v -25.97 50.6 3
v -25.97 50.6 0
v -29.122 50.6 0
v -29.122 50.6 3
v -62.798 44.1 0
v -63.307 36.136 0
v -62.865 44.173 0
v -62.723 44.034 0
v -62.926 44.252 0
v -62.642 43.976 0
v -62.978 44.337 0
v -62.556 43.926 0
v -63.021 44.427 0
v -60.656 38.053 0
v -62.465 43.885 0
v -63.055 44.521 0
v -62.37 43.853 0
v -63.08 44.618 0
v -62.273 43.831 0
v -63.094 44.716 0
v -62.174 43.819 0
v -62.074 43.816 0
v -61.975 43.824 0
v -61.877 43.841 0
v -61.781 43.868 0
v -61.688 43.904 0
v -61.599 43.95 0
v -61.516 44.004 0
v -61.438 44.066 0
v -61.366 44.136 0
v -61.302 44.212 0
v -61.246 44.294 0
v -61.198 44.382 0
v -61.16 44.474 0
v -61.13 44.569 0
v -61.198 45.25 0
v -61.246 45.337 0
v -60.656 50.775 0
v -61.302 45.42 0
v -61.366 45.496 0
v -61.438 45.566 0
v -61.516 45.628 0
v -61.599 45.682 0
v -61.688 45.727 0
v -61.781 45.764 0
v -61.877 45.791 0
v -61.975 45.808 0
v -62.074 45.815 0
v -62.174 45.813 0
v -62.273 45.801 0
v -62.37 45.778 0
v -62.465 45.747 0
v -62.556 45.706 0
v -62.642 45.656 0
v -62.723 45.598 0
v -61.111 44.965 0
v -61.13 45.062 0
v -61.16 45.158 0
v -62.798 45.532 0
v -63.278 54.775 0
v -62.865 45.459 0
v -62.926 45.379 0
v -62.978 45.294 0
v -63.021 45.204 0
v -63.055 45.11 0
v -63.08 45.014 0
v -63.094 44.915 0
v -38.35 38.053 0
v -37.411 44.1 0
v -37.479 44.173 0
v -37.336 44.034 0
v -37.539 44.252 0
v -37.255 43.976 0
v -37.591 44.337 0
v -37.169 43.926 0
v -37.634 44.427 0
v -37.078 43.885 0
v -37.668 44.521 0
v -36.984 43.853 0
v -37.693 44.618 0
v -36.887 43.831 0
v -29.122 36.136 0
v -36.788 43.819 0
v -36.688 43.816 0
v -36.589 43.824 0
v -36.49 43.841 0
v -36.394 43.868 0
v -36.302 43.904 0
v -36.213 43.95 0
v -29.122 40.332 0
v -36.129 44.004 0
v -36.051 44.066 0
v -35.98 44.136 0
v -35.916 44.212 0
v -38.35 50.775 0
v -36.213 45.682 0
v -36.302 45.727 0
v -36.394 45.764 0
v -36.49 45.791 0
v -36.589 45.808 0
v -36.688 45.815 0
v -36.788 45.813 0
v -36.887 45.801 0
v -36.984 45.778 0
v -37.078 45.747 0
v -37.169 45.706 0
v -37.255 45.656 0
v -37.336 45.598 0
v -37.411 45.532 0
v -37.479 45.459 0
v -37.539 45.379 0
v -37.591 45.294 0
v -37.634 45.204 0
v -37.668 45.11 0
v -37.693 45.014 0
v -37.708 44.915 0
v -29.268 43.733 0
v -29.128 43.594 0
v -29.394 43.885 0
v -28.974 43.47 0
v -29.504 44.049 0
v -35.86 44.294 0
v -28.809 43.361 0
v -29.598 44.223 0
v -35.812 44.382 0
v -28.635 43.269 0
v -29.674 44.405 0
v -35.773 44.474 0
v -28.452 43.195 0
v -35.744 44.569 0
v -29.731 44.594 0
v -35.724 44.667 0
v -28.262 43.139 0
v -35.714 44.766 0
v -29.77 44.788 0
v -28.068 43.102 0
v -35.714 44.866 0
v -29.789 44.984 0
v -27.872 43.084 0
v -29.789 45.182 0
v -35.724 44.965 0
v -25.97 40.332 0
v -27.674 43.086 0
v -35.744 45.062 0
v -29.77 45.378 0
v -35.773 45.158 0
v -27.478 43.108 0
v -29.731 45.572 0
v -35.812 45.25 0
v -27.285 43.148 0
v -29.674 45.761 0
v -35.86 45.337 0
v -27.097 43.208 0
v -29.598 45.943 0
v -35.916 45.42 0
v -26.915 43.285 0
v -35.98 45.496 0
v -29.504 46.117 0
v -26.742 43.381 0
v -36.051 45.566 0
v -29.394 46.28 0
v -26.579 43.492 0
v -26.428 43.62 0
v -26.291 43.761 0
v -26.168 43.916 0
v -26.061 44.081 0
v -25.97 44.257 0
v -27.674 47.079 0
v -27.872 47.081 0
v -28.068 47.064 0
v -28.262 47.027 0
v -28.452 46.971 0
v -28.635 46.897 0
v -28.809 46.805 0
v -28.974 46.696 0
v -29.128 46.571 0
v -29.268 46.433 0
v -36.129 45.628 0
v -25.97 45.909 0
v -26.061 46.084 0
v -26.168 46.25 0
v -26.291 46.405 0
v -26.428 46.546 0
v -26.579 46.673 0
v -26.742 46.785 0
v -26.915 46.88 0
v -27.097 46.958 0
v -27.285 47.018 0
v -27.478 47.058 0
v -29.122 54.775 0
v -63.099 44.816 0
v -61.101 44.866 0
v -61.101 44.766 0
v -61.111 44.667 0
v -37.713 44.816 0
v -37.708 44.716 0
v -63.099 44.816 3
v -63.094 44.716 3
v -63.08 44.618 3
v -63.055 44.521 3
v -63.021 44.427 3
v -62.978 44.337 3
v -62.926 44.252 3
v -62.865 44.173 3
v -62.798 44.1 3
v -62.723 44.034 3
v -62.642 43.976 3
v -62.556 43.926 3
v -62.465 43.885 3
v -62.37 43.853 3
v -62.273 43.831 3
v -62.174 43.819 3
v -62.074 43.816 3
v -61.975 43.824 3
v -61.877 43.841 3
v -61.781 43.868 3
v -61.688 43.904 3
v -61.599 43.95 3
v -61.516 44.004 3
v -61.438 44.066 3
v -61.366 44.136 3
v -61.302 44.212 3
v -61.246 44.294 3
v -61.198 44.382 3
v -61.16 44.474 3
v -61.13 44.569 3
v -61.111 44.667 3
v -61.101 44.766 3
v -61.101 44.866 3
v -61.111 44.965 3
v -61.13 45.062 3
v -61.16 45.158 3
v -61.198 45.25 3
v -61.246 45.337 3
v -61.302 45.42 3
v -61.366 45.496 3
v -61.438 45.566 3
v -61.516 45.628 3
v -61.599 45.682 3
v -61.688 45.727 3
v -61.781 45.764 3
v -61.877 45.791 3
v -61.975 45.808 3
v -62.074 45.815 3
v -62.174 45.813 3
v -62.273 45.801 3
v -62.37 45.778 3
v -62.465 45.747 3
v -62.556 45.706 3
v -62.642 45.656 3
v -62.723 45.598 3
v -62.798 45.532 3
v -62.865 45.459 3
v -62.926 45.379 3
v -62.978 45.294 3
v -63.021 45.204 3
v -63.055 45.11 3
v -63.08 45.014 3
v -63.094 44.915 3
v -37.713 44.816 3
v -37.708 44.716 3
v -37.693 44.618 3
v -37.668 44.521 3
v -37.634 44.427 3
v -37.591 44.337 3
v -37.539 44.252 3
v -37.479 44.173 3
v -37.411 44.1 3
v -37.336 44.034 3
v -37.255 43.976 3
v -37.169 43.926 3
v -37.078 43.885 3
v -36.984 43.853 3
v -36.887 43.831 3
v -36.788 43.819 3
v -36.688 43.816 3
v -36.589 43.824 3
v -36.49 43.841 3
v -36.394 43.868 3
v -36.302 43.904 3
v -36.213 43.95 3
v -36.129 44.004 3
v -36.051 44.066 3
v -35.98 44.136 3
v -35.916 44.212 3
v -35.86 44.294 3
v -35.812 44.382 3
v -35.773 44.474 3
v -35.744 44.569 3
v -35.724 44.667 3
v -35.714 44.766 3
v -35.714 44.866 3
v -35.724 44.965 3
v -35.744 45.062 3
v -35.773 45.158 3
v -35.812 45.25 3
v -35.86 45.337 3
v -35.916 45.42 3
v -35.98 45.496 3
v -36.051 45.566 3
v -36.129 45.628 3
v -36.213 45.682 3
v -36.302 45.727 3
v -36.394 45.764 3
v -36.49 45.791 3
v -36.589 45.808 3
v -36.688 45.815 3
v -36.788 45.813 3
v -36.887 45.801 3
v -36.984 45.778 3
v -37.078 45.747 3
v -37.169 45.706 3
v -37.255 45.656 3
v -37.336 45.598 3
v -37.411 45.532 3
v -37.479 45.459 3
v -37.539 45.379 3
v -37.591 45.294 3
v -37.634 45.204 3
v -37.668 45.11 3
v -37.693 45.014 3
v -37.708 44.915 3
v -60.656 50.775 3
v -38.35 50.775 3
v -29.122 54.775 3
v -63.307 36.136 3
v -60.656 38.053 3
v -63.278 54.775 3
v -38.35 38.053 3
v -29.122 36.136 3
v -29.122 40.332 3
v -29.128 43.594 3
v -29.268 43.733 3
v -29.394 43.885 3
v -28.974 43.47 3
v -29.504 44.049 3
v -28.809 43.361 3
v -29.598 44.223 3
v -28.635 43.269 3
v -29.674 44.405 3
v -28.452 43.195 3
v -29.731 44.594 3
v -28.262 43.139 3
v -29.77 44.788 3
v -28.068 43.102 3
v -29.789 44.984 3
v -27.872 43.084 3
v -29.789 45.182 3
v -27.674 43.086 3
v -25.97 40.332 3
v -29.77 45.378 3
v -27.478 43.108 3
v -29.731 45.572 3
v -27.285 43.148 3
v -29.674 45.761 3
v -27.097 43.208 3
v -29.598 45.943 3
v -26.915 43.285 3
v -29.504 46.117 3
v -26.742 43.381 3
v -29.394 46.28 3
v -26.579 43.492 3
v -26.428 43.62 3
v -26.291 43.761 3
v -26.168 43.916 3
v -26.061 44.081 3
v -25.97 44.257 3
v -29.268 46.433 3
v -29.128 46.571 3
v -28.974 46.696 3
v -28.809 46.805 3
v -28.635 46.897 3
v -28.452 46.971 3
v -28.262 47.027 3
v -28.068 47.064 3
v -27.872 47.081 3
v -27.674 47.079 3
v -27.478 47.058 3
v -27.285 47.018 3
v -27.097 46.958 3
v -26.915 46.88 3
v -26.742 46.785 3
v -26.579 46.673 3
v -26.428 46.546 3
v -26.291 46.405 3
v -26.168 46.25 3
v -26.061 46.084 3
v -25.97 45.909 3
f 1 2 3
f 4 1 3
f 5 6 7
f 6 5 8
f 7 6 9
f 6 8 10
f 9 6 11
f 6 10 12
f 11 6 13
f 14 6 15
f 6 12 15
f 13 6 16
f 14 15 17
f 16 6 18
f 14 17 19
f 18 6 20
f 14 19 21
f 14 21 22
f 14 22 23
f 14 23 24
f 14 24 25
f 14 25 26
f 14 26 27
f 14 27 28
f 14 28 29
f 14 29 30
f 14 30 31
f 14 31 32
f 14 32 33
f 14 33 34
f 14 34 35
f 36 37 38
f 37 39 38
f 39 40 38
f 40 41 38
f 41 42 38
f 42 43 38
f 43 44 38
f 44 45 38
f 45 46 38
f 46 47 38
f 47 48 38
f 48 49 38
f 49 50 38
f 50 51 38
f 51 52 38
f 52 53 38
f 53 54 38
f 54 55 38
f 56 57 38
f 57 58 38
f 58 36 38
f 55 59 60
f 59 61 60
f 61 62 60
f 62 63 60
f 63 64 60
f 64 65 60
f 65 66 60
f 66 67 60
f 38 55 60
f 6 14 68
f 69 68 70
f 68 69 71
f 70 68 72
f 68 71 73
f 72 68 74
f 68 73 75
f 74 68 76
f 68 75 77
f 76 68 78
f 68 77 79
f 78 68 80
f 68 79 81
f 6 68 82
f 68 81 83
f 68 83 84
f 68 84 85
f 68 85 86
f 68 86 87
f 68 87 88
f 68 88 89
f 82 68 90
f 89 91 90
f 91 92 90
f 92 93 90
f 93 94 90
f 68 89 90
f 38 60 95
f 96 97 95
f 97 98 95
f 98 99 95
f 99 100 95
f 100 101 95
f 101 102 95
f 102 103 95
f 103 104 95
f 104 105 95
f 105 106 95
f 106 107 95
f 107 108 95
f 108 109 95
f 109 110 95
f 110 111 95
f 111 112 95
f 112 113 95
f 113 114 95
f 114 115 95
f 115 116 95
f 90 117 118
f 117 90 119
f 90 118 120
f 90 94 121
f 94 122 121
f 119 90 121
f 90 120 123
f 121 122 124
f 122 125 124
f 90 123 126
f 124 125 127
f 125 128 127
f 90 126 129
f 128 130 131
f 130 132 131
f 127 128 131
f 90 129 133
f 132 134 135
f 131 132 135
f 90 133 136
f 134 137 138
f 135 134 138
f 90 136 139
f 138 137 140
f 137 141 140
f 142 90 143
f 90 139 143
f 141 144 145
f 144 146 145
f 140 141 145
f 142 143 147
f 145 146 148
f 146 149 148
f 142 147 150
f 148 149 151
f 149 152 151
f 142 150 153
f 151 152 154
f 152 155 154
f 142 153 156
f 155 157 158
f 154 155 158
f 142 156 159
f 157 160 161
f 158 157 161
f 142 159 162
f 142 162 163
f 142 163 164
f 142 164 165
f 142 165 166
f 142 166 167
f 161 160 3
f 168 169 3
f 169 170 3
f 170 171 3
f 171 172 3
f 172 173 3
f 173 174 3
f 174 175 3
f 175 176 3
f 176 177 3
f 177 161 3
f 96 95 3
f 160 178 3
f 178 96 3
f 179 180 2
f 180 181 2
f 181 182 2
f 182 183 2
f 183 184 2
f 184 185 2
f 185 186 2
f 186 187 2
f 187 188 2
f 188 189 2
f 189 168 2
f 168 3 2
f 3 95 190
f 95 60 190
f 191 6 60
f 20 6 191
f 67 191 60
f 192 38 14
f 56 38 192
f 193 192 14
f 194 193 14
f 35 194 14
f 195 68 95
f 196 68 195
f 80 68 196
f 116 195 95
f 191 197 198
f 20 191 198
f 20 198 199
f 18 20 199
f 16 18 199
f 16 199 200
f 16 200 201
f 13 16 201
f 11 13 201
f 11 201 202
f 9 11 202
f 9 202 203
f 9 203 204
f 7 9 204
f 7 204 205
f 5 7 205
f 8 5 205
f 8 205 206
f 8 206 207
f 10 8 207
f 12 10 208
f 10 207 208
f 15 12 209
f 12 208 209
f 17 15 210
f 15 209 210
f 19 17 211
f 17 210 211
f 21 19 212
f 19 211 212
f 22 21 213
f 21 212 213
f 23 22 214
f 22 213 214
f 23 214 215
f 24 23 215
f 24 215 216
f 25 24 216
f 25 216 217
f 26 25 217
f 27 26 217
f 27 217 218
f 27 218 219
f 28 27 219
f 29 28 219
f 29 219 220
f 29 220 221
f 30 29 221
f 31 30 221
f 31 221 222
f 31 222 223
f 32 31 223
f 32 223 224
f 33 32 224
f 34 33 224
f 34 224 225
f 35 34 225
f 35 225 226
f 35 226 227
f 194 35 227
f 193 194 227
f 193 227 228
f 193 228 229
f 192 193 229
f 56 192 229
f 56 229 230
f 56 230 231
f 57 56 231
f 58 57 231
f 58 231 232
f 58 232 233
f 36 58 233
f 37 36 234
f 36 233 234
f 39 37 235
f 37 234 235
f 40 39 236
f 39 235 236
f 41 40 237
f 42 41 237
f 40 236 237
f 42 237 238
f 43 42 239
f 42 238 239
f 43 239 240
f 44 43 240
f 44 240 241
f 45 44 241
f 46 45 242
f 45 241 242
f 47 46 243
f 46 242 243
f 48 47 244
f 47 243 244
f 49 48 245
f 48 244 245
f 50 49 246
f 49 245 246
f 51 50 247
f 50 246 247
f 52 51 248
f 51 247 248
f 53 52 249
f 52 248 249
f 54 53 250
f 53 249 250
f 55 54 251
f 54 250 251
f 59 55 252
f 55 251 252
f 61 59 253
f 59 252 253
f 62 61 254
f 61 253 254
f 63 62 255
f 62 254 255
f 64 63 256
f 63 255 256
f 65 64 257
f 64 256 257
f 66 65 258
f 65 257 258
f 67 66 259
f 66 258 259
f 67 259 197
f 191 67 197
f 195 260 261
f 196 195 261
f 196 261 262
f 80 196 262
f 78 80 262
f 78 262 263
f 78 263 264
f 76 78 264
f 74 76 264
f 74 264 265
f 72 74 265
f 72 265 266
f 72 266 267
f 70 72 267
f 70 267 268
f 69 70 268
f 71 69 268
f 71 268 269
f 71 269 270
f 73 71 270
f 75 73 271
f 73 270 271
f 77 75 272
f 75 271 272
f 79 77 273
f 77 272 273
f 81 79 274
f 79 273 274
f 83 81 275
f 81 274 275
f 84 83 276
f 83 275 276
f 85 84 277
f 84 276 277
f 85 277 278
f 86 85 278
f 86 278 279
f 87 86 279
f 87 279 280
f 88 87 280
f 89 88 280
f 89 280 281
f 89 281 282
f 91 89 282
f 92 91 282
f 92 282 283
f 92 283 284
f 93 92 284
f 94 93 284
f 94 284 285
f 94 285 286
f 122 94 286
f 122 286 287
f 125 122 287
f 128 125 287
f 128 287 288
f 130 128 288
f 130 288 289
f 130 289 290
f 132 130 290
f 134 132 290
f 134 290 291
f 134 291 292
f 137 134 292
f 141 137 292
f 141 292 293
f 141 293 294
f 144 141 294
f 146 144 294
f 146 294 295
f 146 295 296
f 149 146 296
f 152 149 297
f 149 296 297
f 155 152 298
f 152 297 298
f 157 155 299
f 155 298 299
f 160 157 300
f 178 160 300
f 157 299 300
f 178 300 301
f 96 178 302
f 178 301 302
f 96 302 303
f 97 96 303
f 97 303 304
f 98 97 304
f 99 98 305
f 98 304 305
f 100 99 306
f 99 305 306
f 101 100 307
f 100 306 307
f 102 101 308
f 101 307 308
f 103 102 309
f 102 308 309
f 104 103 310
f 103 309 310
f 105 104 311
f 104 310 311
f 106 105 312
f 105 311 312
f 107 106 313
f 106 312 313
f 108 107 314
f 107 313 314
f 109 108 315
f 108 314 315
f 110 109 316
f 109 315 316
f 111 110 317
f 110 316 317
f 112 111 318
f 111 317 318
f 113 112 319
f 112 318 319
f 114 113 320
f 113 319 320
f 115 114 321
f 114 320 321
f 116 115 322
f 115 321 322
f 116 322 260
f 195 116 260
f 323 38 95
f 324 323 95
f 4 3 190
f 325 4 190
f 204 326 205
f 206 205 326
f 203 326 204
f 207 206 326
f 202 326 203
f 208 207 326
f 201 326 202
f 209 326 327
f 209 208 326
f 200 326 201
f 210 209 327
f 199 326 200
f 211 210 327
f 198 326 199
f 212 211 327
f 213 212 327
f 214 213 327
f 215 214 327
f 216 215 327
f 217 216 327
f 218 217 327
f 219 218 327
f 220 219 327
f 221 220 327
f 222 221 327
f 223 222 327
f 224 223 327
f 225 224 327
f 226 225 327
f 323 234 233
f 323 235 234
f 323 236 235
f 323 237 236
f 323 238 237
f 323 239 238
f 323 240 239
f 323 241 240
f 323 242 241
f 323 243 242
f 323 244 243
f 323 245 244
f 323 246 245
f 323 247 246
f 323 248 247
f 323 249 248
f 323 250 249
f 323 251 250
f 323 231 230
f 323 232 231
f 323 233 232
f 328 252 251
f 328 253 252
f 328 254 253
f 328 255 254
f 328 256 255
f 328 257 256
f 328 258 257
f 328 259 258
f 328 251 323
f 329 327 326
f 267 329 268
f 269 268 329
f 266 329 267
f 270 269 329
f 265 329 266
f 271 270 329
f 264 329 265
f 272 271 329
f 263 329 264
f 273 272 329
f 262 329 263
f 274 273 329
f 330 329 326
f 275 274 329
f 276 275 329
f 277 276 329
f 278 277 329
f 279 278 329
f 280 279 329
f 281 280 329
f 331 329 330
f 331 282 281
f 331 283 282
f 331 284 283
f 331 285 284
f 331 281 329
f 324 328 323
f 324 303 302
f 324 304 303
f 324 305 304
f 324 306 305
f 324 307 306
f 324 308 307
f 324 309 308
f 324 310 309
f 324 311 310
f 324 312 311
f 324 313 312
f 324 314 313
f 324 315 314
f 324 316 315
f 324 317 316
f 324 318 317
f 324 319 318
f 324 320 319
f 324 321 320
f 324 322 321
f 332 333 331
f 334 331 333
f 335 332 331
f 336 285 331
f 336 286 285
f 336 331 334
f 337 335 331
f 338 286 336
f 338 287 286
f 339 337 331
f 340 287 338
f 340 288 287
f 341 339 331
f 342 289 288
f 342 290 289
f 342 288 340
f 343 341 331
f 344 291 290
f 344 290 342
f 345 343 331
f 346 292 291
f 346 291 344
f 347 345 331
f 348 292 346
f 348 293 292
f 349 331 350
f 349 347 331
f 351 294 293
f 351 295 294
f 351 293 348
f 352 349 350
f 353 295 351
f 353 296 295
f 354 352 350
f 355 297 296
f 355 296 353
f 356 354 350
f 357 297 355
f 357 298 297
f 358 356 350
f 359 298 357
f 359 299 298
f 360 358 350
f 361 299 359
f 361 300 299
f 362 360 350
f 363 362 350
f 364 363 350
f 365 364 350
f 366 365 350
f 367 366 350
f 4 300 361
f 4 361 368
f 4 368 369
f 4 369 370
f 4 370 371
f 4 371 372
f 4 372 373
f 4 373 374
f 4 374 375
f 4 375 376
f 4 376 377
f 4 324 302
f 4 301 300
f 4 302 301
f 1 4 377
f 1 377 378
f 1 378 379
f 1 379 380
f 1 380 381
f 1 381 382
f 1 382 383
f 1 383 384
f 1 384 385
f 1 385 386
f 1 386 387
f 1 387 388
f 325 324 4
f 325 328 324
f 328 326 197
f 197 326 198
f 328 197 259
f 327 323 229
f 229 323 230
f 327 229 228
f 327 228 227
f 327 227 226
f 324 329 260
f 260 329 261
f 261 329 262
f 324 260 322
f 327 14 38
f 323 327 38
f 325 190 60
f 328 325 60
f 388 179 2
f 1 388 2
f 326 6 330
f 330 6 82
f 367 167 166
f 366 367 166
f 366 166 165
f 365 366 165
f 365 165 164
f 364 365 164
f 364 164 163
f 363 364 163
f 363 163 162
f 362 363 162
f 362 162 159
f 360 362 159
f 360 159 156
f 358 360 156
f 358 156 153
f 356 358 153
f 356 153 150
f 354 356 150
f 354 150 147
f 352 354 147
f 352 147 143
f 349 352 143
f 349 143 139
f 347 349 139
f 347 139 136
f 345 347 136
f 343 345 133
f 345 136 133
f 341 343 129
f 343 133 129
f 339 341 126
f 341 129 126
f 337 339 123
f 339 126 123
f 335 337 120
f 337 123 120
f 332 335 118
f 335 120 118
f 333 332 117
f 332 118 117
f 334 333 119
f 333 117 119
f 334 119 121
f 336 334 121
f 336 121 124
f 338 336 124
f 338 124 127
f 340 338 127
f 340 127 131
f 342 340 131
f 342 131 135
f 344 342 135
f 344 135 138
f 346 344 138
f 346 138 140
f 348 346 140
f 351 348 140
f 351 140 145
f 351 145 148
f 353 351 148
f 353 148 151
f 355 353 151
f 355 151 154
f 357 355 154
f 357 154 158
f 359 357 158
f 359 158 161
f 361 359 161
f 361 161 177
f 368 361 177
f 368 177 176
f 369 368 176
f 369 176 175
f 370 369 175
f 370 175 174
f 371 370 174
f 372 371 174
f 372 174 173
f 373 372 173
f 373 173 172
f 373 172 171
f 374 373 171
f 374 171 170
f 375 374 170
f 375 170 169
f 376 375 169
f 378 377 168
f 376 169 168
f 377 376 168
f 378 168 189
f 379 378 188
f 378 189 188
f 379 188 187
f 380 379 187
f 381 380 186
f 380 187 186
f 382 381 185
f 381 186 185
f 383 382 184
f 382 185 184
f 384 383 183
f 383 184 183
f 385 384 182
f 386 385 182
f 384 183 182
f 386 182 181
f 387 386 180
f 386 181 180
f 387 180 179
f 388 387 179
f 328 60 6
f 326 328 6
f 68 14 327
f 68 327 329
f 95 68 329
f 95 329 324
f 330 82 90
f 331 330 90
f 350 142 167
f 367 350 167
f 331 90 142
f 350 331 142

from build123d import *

# Parameters (mm, degrees)
F0_R     = 1.1224142381
F0_W     = 22.305868566
F0_H     = 12.7213150263
F0_R_2   = 0.6302857898
F0_R_3   = 1.6961440054
F1_DEPTH = 3
F2_D     = 2
F3_D     = 2
F5_D     = 4


with BuildPart() as f1:
    # F0 (on Top) → F1 (new body)
    with BuildSketch(Plane.XY):
        Polygon((-29.121896252, 54.77469787), (-63.2777586579, 54.77469787), (-63.3072480559, 36.1355394125), (-29.121896252, 36.1355394125), (-29.121896252, 40.332082659), (-25.9702913463, 40.332082659), (-25.9702913463, 50.6002567708), (-29.121896252, 50.6002567708), align=None)
        with Locations((-62.0993860066, 44.8157414794)):
            Circle(F0_R, mode=Mode.SUBTRACT)
        with Locations((-49.5029501617, 44.4138646126)):
            Rectangle(F0_W, F0_H, mode=Mode.SUBTRACT)
        with Locations((-36.7128923535, 44.8157414794)):
            Circle(F0_R_2, mode=Mode.SUBTRACT)
        with Locations((-29.121896252, 45.4661697149)):
            Circle(F0_R_3, mode=Mode.SUBTRACT)
        with Locations((-29.121896252, 45.4661697149)):
            Circle(F0_R_3)
        with Locations((-62.0993860066, 44.8157414794)):
            Circle(F0_R)
        with Locations((-36.7128923535, 44.8157414794)):
            Circle(F0_R_2)
    extrude(amount=F1_DEPTH)

    # F2 (through all)
    with Locations(Plane(origin=(0, 0, 0), x_dir=(1, 0, 0), z_dir=(0, 0, -1))):
        with Locations((-62.0993860066, -44.8157414794)):
            Hole(F2_D / 2)

    # F3 (through all)
    with Locations(Plane(origin=(0, 0, 0), x_dir=(1, 0, 0), z_dir=(0, 0, -1))):
        with Locations((-36.7128923535, -44.8157414794)):
            Hole(F3_D / 2)

    # F5 (through all)
    with Locations(Plane.XY.offset(3)):
        with Locations((-27.7918130159, 45.0828969479)):
            Hole(F5_D / 2)


solid = f1.part
